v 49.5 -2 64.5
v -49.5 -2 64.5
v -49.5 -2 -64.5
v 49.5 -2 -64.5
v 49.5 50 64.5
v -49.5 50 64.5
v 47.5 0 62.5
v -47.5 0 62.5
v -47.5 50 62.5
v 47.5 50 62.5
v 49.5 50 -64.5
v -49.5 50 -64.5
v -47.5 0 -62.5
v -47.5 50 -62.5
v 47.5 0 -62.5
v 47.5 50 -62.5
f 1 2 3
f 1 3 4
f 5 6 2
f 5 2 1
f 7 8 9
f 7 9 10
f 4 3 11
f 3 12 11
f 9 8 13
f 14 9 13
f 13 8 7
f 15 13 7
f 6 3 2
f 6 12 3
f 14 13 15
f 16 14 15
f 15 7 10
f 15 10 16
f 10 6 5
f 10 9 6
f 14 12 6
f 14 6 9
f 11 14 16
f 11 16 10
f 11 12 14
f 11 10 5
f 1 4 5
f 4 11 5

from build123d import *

# Parameters (mm, degrees)
SKETCH2_W   = 99
SKETCH2_H   = 129
SKETCH2_W_2 = 95
SKETCH2_H_2 = 125
WALLS_DEPTH = 50
SKETCH3_W   = 99
SKETCH3_H   = 129
BASE_DEPTH  = 2


with BuildPart() as part:
    # Sketch2 → Walls (new body)
    with BuildSketch(Plane(origin=(0, 0, 0), x_dir=(1, 0, 0), z_dir=(0, 1, 0))):
        Rectangle(SKETCH2_W, SKETCH2_H)
        Rectangle(SKETCH2_W_2, SKETCH2_H_2, mode=Mode.SUBTRACT)
    extrude(amount=WALLS_DEPTH)

    # Sketch3 → Base (add)
    with BuildSketch(Plane.XZ):
        Rectangle(SKETCH3_W, SKETCH3_H)
    extrude(amount=BASE_DEPTH)


solid = part.part
